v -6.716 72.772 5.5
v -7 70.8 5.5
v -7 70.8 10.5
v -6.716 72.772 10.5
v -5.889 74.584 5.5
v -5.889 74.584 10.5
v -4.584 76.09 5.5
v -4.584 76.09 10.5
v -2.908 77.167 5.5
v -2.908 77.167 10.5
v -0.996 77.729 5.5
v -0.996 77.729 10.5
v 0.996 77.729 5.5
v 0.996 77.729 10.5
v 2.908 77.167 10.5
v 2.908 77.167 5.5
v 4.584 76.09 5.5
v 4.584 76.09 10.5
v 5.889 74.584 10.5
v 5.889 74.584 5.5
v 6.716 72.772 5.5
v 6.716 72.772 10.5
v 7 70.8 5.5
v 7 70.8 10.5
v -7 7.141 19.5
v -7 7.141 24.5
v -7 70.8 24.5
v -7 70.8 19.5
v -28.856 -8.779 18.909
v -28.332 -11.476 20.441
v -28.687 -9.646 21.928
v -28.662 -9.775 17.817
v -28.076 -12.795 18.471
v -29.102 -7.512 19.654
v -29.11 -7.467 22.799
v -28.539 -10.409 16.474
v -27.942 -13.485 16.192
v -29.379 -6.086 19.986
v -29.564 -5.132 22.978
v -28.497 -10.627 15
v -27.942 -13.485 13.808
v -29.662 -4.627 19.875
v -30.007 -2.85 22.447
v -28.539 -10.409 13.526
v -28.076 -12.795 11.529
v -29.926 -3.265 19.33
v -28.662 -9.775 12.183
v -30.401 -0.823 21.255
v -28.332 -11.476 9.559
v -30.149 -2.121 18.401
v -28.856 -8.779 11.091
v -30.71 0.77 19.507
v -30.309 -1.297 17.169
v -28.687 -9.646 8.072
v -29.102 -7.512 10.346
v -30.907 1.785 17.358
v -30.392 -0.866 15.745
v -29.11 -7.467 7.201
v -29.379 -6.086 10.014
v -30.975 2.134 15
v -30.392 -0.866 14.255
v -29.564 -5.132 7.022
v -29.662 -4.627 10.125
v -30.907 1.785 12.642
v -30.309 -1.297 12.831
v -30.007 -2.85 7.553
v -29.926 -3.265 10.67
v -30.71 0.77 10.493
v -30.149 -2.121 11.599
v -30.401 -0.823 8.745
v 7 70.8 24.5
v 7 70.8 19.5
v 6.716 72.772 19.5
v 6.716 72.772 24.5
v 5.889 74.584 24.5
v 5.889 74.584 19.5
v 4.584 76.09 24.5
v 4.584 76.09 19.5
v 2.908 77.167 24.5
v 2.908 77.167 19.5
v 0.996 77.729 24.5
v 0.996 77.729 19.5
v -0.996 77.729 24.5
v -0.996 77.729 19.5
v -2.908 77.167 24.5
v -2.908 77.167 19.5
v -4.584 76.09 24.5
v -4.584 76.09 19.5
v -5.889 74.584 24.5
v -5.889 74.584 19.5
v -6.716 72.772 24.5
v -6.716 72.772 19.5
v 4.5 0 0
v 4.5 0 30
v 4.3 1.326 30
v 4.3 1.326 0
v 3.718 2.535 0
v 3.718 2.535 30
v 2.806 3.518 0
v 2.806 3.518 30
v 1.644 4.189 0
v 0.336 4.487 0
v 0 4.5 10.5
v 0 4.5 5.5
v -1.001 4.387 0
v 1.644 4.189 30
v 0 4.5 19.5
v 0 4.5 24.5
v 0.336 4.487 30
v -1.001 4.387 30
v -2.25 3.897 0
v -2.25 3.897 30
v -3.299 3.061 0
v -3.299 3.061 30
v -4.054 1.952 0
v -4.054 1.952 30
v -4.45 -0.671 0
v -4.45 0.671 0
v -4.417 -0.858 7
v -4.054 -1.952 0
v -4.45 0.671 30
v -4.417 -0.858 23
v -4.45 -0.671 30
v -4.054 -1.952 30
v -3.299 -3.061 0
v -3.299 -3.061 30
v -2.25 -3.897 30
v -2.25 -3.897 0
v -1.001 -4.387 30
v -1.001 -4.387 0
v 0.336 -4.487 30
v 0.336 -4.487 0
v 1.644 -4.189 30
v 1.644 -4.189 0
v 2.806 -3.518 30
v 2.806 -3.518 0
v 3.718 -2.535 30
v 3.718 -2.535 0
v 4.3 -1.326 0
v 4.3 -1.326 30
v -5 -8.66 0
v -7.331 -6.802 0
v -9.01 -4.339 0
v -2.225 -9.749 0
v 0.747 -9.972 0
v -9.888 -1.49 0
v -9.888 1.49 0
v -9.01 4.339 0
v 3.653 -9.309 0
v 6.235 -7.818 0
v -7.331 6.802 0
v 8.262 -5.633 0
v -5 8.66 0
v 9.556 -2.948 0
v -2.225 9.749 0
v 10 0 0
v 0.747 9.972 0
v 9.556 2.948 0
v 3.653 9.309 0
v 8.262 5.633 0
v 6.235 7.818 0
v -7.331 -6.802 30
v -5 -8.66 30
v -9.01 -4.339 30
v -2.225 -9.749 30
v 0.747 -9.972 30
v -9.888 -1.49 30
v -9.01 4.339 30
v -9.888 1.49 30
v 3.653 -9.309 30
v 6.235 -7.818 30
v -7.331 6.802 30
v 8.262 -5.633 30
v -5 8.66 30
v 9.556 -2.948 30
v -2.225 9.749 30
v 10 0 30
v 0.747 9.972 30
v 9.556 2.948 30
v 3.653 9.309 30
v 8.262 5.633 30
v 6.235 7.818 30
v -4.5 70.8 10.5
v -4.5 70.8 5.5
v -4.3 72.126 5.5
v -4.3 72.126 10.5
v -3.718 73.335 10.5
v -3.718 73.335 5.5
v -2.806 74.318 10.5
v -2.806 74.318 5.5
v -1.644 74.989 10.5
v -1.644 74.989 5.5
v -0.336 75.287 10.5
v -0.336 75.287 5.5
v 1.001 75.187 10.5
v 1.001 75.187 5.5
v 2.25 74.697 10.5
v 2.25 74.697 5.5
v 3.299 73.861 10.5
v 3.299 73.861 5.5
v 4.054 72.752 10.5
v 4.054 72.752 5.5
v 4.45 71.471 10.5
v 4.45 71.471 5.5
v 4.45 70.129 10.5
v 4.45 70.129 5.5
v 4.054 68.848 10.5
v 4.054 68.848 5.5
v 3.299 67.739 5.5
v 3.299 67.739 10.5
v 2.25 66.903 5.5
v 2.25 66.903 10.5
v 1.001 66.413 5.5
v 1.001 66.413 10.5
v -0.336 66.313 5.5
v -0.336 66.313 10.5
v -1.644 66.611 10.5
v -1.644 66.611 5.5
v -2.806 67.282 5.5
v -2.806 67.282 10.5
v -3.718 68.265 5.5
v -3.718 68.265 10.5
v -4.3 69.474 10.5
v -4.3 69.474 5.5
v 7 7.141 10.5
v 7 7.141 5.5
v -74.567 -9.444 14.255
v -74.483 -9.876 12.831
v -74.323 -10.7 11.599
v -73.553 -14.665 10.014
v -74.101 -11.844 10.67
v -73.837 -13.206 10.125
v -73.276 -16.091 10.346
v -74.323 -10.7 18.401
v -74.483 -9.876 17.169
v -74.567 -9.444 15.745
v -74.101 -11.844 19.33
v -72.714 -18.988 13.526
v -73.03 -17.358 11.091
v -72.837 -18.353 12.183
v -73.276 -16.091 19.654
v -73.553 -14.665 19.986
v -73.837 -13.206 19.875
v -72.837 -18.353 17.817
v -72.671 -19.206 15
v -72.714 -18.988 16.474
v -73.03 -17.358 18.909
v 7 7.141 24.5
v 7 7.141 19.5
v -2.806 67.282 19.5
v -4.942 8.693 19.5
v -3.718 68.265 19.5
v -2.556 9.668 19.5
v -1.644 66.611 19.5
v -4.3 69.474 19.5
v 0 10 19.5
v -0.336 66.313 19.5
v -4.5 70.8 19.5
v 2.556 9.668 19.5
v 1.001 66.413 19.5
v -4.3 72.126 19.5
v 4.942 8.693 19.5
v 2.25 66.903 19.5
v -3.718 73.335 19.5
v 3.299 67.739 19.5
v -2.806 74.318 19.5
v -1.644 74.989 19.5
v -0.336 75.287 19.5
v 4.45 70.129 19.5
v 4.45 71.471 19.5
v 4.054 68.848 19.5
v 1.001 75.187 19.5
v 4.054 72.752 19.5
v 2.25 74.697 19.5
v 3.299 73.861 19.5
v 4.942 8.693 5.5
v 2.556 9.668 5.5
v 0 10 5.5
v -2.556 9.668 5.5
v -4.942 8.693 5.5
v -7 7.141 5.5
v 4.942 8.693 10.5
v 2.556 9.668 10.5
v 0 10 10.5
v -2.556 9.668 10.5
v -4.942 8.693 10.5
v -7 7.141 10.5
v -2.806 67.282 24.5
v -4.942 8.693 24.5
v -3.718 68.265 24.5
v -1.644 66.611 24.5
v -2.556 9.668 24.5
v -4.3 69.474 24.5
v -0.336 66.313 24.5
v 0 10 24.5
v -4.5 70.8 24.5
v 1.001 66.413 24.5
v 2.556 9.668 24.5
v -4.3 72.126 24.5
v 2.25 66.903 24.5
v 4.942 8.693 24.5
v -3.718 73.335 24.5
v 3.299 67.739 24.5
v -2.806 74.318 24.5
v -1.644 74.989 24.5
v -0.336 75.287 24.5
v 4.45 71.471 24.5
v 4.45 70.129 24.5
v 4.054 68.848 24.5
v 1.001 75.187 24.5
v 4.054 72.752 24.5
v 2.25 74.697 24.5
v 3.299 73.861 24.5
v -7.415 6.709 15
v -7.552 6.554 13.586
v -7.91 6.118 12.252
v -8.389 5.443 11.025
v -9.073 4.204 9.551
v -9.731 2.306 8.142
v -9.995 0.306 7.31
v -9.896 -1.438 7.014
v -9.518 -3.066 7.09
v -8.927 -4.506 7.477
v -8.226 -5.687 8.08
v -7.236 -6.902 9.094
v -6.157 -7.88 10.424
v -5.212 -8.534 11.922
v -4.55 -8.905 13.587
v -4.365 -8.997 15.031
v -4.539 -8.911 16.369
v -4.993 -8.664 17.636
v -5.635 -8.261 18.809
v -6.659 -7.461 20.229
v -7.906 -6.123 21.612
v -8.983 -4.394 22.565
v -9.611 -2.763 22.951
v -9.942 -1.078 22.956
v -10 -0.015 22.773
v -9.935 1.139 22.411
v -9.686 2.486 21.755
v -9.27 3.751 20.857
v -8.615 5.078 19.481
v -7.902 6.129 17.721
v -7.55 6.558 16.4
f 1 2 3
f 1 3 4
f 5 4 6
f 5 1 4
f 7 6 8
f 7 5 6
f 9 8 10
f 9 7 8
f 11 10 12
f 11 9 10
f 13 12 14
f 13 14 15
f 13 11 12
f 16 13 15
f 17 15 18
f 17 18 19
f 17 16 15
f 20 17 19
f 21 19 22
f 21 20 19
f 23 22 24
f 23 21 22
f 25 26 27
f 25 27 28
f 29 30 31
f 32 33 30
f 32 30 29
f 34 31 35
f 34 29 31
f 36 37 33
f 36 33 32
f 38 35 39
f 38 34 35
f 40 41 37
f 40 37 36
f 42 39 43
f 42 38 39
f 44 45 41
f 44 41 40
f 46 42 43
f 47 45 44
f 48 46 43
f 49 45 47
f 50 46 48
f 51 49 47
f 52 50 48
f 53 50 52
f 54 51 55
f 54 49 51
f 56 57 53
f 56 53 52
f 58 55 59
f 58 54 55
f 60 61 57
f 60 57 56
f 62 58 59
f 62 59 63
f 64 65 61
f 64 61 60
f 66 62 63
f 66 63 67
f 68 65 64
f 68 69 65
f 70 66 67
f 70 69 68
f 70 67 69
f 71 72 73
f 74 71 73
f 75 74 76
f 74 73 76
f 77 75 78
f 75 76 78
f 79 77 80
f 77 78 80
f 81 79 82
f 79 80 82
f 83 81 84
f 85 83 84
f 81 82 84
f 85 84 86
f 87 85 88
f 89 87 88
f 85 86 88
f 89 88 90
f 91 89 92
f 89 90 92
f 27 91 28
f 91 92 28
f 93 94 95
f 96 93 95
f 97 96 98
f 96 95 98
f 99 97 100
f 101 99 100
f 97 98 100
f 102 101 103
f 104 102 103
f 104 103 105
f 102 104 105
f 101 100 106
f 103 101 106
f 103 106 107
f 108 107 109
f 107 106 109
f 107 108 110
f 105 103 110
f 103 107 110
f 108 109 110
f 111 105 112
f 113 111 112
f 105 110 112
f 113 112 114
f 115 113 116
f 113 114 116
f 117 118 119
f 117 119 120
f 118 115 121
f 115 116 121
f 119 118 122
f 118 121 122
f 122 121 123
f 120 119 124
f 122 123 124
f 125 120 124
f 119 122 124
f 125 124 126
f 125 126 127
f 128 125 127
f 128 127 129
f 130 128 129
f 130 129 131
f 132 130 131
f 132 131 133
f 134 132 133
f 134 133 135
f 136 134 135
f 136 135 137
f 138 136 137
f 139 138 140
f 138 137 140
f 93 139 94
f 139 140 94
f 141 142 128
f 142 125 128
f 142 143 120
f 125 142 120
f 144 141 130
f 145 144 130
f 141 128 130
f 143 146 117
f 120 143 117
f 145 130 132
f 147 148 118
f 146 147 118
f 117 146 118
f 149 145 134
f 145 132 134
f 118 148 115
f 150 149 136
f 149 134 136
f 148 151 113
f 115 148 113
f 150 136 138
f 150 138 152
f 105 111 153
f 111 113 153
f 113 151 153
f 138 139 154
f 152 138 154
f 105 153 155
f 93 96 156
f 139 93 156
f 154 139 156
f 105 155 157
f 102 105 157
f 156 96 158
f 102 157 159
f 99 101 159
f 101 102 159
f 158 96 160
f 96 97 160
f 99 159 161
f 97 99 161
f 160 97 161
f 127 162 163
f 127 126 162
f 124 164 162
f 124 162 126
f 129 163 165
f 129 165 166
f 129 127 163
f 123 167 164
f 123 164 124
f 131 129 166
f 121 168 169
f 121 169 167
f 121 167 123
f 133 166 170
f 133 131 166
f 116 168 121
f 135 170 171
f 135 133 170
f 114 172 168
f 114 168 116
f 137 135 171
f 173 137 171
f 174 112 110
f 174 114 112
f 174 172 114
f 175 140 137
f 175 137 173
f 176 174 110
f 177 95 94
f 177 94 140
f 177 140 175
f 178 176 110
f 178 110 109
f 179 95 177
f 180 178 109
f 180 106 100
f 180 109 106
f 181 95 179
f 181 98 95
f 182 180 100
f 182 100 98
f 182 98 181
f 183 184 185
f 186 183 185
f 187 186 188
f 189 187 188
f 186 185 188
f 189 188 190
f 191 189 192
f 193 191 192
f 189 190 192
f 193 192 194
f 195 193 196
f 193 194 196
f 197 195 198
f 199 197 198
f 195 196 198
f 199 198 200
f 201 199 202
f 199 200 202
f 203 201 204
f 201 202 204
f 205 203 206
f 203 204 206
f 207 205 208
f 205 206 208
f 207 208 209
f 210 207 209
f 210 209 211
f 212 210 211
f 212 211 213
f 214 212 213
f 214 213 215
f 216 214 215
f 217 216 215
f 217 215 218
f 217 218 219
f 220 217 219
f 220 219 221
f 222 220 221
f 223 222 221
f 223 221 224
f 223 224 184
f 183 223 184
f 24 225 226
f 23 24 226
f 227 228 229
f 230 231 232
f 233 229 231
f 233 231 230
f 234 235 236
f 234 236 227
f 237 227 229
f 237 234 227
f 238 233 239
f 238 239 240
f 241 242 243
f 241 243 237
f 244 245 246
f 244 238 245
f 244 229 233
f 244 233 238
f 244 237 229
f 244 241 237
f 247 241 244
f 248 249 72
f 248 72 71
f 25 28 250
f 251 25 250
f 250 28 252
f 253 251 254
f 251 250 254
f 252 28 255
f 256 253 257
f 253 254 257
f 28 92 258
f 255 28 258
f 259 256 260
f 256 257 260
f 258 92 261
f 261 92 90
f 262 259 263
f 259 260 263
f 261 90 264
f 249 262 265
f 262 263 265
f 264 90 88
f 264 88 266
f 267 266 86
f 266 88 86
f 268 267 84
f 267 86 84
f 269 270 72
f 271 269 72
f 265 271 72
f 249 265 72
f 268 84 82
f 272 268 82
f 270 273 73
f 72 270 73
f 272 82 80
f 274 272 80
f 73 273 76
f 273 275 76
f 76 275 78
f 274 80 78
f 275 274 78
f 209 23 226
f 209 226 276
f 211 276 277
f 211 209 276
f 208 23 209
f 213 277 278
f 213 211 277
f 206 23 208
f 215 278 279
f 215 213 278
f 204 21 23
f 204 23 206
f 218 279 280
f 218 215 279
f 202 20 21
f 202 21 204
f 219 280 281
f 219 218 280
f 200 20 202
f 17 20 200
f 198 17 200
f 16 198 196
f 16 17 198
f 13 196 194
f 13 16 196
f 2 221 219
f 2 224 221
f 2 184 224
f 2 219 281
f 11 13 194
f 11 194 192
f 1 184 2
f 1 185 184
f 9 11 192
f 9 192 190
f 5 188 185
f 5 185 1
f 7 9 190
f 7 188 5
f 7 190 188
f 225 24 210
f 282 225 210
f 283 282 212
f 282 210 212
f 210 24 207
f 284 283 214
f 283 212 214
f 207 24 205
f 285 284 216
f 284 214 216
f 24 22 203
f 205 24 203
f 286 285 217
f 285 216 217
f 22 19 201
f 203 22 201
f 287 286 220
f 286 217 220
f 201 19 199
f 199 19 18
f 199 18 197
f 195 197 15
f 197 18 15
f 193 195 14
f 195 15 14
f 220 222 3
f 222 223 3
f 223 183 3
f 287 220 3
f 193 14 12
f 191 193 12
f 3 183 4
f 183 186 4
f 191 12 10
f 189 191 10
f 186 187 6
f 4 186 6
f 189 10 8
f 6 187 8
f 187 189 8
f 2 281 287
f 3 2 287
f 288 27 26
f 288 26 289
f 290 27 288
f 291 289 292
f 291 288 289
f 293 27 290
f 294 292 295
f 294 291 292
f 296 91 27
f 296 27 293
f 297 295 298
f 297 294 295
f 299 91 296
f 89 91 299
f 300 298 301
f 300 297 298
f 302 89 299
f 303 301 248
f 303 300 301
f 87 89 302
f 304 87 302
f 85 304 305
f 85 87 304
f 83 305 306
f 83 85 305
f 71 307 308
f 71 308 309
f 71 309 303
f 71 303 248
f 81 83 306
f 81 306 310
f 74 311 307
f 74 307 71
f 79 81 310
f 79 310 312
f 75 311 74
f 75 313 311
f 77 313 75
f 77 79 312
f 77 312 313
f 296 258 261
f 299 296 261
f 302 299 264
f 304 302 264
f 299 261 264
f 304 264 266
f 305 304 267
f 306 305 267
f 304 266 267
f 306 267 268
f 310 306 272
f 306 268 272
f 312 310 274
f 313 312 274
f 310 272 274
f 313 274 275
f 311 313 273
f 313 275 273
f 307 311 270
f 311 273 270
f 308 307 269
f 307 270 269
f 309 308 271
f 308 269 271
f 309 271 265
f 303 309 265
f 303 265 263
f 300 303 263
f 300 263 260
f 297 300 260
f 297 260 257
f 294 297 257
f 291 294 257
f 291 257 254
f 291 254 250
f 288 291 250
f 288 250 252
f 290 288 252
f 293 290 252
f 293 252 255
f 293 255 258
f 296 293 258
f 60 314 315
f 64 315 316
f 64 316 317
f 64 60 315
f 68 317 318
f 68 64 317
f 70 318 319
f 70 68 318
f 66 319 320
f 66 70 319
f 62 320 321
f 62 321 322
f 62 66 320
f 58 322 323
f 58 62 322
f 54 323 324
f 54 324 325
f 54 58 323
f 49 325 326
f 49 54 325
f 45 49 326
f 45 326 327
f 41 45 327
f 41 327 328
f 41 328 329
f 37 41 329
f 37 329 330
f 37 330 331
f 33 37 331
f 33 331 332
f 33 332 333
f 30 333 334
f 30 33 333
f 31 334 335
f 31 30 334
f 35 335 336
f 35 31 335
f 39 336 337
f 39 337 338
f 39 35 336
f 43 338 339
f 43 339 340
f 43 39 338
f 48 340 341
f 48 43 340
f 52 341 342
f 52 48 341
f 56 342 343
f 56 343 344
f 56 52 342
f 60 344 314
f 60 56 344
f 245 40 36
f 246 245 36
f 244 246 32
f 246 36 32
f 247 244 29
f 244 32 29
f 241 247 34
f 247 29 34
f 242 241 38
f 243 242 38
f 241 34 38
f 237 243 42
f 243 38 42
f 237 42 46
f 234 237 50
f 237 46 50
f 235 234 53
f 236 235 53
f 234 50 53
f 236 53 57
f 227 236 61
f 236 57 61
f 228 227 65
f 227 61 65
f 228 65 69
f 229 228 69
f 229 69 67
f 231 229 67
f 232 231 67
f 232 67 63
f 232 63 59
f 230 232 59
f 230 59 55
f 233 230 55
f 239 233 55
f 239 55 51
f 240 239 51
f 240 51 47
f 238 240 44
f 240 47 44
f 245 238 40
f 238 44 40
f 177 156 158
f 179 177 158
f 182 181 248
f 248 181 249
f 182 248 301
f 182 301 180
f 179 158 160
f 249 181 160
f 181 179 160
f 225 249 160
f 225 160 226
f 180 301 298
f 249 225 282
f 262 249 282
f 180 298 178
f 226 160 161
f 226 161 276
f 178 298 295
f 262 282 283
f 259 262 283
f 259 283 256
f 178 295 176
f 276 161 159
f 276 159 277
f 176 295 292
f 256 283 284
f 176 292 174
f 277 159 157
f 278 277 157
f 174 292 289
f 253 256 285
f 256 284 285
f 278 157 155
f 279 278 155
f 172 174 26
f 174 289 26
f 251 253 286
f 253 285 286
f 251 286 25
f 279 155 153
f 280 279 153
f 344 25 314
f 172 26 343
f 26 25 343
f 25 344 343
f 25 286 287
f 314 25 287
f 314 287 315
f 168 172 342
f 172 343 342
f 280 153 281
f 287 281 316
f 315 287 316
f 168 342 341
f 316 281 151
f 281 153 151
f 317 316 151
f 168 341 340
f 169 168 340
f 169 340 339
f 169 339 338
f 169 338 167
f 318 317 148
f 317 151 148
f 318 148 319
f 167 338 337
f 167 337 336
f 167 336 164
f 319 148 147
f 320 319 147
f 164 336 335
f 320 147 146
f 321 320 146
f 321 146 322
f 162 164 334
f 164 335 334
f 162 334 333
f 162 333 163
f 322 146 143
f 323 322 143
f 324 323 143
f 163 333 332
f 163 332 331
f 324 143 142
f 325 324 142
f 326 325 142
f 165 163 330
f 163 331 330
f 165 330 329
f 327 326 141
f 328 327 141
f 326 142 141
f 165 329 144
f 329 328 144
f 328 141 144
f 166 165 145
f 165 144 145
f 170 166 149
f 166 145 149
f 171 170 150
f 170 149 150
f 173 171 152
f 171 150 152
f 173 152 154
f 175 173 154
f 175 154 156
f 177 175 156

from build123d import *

# Parameters (mm, degrees)
SKETCH_1_R          = 10
EXTRUDE_1_DEPTH     = 30
SKETCH_2_R          = 4.5
CUT_EXTRUDE_1_DEPTH = 30
EXTRUDE_START       = 4.5
EXTRUDE_2_DEPTH     = 66.3
EXTRUDE_3_DEPTH     = 5
EXTRUDE_START_2     = -5
EXTRUDE_4_DEPTH     = 5
SKETCH_6_R          = 4.5
CUT_EXTRUDE_2_DEPTH = 27
SKETCH_17_R         = 5
EXTRUDE_9_DEPTH     = 45


with BuildPart() as part:
    # 草图1 → 凸台-拉伸1 (new body)
    with BuildSketch(Plane.XY):
        Circle(SKETCH_1_R)
    extrude(amount=EXTRUDE_1_DEPTH)

    # 草图2 → 切除-拉伸1 (cut)
    with BuildSketch(Plane.XY.offset(30)):
        Circle(SKETCH_2_R)
    extrude(amount=-CUT_EXTRUDE_1_DEPTH, mode=Mode.SUBTRACT)

    # 草图3 → 凸台-拉伸2 (add)
    with BuildSketch(Plane(origin=(0, 0, 0), x_dir=(1, 0, 0), z_dir=(0, 1, 0)).offset(EXTRUDE_START)):
        Polygon((0, -19.5), (7, -19.5), (7, -24.5), (-7, -24.5), (-7, -19.5), align=None)
        Polygon((0, -10.5), (7, -10.5), (7, -5.5), (-7, -5.5), (-7, -10.5), align=None)
    extrude(amount=EXTRUDE_2_DEPTH)

    # 草图4 → 凸台-拉伸3 (add)
    with BuildSketch(Plane(origin=(0, 0, 5.5), x_dir=(-1, 0, 0), z_dir=(0, 0, -1))):
        with BuildLine():
            Line((-7, 70.8), (7, 70.8))
            ThreePointArc((7, 70.8), (0, 77.8), (-7, 70.8))
        make_face()
    extrude(amount=-EXTRUDE_3_DEPTH)

    # 草图5 → 凸台-拉伸4 (add)
    with BuildSketch(Plane.XY.offset(24.5).offset(EXTRUDE_START_2)):
        with BuildLine():
            Line((-7, 70.8), (7, 70.8))
            ThreePointArc((7, 70.8), (0, 77.8), (-7, 70.8))
        make_face()
    extrude(amount=EXTRUDE_4_DEPTH)

    # 草图6 → 切除-拉伸2 (cut)
    with BuildSketch(Plane(origin=(0, 0, 5.5), x_dir=(-1, 0, 0), z_dir=(0, 0, -1))):
        with Locations((0, 70.8)):
            Circle(SKETCH_6_R)
    extrude(amount=-CUT_EXTRUDE_2_DEPTH, mode=Mode.SUBTRACT)

    # 草图15 → 旋转1 (revolve)
    with BuildSketch(Plane.XY.offset(15)):
        Polygon((-4.417472119, -0.857869498), (-5.942573449, 6.99541427), (-30.974915458, 2.134153781), (-29.449814128, -5.719129986), align=None)
    revolve(axis=Axis((-4.417472119, -0.857869498, 15), (-0.9816604709485747, -0.1906376662074486, 0)))

    # 草图17 → 凸台-拉伸9 (add)
    with BuildSketch(Plane(origin=(-29.449814128, -5.719129986, 0), x_dir=(0, 0, 1), z_dir=(-0.9816604709485748, -0.19063766620744863, 0))):
        with Locations(Location((15, 0, 0), (0, 0, 270))):
            Circle(SKETCH_17_R)
    extrude(amount=EXTRUDE_9_DEPTH)


solid = part.part
